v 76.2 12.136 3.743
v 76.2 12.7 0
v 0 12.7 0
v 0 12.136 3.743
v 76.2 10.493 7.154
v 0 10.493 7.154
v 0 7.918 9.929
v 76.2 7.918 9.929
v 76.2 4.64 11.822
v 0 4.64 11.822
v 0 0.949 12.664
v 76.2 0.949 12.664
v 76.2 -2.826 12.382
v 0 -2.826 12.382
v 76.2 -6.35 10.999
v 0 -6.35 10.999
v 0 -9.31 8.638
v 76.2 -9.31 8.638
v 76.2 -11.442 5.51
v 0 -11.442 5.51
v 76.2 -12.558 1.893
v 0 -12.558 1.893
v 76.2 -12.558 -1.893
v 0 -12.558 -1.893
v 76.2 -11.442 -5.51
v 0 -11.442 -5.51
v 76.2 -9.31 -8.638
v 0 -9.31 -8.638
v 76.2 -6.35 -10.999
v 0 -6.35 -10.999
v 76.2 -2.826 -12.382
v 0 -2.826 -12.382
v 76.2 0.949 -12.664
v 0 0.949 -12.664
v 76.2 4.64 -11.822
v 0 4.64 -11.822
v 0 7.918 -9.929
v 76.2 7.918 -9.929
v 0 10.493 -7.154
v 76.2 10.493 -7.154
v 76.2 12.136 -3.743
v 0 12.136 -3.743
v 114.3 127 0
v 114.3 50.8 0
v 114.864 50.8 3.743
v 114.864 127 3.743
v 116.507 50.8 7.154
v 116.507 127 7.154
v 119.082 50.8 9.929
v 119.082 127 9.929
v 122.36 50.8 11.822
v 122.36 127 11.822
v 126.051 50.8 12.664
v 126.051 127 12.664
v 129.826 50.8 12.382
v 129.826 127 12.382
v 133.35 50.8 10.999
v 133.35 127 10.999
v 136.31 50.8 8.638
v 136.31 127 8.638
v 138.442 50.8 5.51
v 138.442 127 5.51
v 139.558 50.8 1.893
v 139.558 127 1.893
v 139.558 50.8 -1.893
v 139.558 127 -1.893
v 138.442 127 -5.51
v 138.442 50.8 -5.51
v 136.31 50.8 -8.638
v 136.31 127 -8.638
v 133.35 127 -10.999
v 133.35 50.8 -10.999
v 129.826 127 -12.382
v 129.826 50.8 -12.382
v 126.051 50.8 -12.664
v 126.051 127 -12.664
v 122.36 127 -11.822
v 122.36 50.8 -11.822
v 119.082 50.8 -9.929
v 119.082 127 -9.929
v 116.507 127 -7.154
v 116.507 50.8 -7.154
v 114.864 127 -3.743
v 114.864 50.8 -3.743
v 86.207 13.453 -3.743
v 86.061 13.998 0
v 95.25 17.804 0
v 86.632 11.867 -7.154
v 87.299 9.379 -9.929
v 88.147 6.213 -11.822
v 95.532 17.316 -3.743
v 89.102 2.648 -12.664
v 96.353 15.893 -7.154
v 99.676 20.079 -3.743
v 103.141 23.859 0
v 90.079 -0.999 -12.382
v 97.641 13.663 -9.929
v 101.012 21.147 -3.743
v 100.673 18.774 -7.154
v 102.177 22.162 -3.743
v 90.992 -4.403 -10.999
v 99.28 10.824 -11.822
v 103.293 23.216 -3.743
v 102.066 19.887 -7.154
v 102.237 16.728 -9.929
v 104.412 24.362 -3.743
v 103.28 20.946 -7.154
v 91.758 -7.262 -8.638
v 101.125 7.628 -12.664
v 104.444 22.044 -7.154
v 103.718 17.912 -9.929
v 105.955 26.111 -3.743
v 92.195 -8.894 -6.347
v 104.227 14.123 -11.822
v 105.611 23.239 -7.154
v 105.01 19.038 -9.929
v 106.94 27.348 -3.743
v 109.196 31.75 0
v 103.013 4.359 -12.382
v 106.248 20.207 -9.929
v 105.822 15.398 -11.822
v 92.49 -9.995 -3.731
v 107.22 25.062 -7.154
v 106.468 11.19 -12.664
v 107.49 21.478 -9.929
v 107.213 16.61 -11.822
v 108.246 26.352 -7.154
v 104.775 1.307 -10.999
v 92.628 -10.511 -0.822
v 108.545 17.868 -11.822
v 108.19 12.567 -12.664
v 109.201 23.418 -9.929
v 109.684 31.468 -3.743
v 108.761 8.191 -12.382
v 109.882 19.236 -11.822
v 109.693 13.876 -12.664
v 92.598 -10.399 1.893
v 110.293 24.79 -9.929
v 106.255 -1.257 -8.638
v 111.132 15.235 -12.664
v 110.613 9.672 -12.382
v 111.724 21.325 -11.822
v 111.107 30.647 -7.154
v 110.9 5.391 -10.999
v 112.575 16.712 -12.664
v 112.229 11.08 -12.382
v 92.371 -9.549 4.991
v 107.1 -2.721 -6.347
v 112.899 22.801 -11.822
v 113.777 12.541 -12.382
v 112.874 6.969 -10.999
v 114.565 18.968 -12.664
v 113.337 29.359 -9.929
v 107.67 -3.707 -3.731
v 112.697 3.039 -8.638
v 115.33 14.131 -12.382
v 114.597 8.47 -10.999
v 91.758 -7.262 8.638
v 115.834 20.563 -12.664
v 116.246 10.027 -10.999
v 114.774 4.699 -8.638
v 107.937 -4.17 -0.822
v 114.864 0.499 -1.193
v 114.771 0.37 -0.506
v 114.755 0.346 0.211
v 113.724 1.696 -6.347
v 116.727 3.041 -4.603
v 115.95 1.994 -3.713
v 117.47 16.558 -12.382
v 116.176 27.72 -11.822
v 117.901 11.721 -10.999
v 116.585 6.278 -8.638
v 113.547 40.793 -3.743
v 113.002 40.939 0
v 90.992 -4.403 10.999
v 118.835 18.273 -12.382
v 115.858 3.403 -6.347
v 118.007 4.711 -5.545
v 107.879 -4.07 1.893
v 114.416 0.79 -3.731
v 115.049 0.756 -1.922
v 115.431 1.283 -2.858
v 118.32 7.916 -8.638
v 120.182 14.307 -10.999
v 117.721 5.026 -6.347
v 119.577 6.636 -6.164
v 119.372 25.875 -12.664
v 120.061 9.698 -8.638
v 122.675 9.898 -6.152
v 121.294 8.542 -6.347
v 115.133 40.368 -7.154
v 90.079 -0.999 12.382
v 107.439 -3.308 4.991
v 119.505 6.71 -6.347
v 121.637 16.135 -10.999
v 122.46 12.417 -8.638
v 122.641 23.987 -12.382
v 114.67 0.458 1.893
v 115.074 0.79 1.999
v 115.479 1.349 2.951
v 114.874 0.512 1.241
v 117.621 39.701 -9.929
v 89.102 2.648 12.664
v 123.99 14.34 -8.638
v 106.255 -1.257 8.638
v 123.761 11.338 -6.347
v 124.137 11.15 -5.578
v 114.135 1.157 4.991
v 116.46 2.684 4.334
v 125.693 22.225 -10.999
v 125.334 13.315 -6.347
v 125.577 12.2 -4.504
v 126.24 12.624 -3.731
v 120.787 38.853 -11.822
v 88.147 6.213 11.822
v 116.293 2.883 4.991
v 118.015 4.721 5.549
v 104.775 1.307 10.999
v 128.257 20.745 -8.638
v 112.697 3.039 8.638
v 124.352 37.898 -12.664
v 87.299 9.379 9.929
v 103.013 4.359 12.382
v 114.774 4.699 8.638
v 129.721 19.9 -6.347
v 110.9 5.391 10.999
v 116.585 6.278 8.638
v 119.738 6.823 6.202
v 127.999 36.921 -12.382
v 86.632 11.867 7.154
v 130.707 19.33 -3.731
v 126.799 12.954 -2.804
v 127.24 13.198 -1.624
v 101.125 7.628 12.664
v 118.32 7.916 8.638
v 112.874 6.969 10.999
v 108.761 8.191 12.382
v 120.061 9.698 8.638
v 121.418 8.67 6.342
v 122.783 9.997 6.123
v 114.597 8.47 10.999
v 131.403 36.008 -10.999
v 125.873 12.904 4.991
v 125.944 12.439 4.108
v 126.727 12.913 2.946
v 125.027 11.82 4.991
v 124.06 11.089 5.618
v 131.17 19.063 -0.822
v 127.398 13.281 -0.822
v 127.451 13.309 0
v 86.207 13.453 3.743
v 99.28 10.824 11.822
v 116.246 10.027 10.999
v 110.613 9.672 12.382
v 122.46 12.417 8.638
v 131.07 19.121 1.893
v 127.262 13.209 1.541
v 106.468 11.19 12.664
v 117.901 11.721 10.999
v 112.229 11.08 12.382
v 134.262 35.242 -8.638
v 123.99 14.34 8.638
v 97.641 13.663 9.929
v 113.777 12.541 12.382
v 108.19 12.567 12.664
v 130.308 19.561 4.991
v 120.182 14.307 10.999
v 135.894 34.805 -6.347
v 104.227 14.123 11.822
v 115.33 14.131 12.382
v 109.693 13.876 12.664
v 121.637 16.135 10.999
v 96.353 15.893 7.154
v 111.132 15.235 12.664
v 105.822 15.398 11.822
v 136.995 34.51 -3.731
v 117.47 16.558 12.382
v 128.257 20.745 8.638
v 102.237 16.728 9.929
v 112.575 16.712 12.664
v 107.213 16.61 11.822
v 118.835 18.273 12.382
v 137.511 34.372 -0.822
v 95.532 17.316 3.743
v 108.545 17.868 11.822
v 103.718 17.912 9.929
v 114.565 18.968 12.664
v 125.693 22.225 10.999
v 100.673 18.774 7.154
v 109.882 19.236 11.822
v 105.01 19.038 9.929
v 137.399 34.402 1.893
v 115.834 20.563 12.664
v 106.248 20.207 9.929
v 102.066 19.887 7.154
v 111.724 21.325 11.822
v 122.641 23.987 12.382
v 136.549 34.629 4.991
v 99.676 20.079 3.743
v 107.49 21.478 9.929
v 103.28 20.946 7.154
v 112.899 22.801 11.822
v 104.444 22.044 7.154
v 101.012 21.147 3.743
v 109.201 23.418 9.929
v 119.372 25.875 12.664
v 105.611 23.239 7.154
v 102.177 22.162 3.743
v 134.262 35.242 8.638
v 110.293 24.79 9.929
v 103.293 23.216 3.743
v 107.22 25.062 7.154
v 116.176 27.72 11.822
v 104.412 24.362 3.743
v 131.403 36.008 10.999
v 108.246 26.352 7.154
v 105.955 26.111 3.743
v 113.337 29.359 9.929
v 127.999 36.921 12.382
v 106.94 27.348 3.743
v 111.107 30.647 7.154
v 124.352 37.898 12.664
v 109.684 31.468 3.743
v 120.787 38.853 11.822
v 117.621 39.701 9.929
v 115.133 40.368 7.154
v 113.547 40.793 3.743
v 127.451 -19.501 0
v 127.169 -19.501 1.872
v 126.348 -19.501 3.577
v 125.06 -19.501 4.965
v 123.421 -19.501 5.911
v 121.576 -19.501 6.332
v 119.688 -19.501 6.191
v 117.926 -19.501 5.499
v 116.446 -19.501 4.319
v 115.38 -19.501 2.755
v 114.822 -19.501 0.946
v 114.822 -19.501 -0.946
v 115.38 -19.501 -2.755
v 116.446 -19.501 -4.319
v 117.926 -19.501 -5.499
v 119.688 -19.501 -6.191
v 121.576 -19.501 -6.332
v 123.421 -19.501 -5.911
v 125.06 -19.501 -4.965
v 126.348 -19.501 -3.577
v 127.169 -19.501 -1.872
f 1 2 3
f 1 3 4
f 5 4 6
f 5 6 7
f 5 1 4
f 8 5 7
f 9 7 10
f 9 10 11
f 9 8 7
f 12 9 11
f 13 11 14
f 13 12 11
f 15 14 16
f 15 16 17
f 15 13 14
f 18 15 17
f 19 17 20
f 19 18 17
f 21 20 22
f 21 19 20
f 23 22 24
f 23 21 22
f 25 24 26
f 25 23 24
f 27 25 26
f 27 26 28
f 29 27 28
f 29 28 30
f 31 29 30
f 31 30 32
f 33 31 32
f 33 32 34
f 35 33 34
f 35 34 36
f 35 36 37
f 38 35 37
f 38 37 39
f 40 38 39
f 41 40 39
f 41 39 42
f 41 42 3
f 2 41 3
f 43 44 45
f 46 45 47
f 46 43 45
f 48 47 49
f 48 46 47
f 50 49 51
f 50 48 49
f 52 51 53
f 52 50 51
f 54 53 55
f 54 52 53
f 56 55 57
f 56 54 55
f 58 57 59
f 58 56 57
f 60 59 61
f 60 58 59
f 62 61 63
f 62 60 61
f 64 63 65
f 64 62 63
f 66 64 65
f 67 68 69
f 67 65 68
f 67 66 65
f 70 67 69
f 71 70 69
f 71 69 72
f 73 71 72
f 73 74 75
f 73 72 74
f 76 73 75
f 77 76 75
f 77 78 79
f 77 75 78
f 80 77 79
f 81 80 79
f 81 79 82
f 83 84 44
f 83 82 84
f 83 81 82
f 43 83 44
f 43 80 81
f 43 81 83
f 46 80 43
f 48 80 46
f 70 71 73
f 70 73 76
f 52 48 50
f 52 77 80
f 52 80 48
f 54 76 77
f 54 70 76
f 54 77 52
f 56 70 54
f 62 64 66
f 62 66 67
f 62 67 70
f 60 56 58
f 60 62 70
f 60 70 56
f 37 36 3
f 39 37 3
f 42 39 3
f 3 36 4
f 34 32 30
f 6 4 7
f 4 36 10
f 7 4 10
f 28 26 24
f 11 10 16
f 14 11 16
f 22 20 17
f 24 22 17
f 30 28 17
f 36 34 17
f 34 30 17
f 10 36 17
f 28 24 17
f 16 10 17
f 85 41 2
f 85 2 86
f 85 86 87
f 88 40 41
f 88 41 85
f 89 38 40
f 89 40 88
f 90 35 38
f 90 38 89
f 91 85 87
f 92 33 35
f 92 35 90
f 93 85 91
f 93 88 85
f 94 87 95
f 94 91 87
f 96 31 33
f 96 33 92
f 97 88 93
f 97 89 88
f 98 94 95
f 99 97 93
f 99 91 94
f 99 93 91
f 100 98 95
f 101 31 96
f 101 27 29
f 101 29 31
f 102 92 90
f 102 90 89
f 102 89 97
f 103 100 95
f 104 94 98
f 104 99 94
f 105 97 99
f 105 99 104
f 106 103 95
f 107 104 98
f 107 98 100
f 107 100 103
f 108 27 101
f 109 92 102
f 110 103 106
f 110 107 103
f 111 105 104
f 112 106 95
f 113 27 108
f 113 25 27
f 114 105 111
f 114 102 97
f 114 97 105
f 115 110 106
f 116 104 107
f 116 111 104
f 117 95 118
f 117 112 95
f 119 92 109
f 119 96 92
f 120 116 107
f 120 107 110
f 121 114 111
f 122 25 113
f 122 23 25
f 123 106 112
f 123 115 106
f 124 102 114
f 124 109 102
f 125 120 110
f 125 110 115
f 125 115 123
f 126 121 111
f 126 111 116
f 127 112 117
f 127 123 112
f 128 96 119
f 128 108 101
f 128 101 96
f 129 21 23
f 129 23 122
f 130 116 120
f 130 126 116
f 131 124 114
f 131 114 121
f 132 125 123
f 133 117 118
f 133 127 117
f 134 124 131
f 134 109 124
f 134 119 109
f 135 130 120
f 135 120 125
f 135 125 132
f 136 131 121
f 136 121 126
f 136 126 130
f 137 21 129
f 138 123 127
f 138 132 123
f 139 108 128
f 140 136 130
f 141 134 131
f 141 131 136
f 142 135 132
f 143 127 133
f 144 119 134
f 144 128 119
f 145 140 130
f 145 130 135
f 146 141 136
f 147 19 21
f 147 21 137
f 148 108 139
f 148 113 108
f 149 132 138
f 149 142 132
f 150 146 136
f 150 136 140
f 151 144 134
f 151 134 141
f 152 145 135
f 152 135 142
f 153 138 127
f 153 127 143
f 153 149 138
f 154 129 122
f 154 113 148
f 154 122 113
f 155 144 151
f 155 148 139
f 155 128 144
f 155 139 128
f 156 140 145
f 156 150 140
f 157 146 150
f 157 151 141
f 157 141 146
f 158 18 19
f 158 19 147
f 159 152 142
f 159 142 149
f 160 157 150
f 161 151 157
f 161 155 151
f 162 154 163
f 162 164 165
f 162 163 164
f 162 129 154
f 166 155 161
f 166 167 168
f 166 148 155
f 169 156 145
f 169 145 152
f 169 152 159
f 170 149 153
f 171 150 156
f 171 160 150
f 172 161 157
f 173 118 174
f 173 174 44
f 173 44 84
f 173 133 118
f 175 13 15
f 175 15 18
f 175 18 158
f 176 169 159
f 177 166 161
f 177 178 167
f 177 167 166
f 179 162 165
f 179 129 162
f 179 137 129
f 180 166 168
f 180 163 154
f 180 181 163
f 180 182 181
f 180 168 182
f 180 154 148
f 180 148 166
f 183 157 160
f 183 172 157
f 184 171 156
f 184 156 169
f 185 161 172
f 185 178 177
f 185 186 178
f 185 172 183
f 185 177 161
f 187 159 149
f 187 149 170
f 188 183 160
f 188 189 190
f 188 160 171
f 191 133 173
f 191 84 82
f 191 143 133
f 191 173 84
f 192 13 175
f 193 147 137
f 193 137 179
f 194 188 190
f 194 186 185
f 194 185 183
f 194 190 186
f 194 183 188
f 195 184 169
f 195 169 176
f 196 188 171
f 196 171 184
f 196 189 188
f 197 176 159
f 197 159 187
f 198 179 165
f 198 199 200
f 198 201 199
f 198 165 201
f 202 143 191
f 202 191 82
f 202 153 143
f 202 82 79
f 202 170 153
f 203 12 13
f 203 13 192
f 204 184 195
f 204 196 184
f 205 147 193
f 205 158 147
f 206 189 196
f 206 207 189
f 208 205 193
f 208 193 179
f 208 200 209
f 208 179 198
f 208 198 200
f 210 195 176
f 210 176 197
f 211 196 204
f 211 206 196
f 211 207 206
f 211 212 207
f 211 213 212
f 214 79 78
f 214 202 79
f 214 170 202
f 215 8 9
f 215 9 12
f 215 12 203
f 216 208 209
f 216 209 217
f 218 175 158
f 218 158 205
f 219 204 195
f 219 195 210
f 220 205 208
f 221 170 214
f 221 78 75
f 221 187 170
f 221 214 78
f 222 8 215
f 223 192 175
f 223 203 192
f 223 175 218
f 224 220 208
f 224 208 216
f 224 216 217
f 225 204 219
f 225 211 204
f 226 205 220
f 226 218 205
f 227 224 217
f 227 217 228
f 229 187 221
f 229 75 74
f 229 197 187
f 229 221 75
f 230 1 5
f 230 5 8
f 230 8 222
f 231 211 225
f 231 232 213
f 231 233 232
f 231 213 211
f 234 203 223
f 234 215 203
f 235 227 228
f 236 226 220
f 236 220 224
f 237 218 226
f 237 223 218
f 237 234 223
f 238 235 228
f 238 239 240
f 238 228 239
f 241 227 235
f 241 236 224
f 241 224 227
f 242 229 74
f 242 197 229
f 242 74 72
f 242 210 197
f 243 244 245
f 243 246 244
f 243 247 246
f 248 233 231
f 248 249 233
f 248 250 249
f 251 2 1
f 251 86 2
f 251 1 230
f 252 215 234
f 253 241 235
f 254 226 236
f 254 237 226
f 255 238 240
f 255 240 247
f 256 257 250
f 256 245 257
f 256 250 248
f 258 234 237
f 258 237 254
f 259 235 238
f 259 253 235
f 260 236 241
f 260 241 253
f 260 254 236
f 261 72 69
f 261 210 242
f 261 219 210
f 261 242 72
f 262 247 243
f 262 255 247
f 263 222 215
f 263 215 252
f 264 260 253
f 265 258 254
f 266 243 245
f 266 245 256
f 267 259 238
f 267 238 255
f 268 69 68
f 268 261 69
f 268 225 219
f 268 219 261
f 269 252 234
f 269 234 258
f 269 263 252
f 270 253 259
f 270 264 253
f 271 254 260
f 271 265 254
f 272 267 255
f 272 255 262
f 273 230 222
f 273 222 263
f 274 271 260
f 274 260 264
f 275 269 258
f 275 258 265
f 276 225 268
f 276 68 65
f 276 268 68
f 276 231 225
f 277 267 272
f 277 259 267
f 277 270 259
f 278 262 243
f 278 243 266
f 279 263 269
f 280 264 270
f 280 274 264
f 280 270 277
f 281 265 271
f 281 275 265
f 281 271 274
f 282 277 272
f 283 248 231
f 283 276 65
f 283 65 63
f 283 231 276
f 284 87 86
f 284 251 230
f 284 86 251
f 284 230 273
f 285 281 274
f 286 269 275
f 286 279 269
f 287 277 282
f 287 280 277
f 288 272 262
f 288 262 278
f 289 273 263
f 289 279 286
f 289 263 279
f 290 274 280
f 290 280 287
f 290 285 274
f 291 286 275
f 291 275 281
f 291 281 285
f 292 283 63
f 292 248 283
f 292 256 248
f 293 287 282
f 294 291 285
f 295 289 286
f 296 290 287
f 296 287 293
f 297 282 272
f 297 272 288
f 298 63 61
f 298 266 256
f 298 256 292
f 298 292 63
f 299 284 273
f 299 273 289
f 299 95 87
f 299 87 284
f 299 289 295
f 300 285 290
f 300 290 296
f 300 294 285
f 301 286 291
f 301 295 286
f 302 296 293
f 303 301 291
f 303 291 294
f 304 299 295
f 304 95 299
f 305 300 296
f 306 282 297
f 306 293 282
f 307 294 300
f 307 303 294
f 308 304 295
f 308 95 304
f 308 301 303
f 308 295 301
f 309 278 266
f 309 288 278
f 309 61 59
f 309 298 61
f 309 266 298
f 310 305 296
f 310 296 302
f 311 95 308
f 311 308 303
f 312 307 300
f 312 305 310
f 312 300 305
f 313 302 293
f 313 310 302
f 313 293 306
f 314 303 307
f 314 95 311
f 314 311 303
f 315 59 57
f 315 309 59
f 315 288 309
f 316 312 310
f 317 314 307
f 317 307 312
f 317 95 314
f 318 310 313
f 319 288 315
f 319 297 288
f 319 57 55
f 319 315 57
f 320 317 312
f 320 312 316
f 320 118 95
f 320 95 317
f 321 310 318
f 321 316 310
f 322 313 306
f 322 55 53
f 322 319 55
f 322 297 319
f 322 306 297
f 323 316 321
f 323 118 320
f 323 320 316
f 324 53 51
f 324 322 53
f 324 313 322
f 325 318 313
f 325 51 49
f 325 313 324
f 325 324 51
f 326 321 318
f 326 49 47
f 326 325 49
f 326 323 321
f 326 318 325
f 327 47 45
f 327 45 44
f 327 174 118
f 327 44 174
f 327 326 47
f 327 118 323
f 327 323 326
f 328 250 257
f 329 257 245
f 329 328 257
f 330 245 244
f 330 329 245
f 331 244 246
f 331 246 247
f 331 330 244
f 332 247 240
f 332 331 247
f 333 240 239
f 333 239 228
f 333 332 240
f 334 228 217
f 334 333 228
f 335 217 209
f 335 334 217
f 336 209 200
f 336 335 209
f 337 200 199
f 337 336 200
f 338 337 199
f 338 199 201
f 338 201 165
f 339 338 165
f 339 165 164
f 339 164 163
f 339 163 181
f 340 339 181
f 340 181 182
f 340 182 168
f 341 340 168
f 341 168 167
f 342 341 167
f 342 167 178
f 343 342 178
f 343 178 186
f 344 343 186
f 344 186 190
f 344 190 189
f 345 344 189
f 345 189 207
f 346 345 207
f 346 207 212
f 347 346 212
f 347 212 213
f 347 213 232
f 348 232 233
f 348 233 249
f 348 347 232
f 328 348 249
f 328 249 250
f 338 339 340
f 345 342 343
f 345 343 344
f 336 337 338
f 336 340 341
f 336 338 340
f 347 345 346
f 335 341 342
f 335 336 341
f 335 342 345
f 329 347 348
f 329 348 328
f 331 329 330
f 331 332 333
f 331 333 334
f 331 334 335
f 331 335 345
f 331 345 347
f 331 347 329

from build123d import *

# Parameters (mm, degrees)
F1_R     = 12.7
F5_R     = 6.35
F6_DEPTH = 32.810532029


with BuildPart() as f2:
    # F2: sweep along a path in F0
    with BuildLine(Plane.XY) as f2_path:
        Line((0, 0), (76.2, 0))
        ThreePointArc((76.2, 0), (112.1210244843, 14.8789755157), (127, 50.8))
        Line((127, 50.8), (127, 127))
    # F1 (on Right) → F2 (sweep)
    with BuildSketch(Plane.YZ):
        Circle(F1_R)
    sweep(path=f2_path.line)

    # F5 (on plane+point) → F6 (join, through all)
    with BuildSketch(Plane.XZ.offset(19.5012806053)):
        with Locations((121.1012806053, 0)):
            Circle(F5_R)
    extrude(amount=-F6_DEPTH)


solid = f2.part
